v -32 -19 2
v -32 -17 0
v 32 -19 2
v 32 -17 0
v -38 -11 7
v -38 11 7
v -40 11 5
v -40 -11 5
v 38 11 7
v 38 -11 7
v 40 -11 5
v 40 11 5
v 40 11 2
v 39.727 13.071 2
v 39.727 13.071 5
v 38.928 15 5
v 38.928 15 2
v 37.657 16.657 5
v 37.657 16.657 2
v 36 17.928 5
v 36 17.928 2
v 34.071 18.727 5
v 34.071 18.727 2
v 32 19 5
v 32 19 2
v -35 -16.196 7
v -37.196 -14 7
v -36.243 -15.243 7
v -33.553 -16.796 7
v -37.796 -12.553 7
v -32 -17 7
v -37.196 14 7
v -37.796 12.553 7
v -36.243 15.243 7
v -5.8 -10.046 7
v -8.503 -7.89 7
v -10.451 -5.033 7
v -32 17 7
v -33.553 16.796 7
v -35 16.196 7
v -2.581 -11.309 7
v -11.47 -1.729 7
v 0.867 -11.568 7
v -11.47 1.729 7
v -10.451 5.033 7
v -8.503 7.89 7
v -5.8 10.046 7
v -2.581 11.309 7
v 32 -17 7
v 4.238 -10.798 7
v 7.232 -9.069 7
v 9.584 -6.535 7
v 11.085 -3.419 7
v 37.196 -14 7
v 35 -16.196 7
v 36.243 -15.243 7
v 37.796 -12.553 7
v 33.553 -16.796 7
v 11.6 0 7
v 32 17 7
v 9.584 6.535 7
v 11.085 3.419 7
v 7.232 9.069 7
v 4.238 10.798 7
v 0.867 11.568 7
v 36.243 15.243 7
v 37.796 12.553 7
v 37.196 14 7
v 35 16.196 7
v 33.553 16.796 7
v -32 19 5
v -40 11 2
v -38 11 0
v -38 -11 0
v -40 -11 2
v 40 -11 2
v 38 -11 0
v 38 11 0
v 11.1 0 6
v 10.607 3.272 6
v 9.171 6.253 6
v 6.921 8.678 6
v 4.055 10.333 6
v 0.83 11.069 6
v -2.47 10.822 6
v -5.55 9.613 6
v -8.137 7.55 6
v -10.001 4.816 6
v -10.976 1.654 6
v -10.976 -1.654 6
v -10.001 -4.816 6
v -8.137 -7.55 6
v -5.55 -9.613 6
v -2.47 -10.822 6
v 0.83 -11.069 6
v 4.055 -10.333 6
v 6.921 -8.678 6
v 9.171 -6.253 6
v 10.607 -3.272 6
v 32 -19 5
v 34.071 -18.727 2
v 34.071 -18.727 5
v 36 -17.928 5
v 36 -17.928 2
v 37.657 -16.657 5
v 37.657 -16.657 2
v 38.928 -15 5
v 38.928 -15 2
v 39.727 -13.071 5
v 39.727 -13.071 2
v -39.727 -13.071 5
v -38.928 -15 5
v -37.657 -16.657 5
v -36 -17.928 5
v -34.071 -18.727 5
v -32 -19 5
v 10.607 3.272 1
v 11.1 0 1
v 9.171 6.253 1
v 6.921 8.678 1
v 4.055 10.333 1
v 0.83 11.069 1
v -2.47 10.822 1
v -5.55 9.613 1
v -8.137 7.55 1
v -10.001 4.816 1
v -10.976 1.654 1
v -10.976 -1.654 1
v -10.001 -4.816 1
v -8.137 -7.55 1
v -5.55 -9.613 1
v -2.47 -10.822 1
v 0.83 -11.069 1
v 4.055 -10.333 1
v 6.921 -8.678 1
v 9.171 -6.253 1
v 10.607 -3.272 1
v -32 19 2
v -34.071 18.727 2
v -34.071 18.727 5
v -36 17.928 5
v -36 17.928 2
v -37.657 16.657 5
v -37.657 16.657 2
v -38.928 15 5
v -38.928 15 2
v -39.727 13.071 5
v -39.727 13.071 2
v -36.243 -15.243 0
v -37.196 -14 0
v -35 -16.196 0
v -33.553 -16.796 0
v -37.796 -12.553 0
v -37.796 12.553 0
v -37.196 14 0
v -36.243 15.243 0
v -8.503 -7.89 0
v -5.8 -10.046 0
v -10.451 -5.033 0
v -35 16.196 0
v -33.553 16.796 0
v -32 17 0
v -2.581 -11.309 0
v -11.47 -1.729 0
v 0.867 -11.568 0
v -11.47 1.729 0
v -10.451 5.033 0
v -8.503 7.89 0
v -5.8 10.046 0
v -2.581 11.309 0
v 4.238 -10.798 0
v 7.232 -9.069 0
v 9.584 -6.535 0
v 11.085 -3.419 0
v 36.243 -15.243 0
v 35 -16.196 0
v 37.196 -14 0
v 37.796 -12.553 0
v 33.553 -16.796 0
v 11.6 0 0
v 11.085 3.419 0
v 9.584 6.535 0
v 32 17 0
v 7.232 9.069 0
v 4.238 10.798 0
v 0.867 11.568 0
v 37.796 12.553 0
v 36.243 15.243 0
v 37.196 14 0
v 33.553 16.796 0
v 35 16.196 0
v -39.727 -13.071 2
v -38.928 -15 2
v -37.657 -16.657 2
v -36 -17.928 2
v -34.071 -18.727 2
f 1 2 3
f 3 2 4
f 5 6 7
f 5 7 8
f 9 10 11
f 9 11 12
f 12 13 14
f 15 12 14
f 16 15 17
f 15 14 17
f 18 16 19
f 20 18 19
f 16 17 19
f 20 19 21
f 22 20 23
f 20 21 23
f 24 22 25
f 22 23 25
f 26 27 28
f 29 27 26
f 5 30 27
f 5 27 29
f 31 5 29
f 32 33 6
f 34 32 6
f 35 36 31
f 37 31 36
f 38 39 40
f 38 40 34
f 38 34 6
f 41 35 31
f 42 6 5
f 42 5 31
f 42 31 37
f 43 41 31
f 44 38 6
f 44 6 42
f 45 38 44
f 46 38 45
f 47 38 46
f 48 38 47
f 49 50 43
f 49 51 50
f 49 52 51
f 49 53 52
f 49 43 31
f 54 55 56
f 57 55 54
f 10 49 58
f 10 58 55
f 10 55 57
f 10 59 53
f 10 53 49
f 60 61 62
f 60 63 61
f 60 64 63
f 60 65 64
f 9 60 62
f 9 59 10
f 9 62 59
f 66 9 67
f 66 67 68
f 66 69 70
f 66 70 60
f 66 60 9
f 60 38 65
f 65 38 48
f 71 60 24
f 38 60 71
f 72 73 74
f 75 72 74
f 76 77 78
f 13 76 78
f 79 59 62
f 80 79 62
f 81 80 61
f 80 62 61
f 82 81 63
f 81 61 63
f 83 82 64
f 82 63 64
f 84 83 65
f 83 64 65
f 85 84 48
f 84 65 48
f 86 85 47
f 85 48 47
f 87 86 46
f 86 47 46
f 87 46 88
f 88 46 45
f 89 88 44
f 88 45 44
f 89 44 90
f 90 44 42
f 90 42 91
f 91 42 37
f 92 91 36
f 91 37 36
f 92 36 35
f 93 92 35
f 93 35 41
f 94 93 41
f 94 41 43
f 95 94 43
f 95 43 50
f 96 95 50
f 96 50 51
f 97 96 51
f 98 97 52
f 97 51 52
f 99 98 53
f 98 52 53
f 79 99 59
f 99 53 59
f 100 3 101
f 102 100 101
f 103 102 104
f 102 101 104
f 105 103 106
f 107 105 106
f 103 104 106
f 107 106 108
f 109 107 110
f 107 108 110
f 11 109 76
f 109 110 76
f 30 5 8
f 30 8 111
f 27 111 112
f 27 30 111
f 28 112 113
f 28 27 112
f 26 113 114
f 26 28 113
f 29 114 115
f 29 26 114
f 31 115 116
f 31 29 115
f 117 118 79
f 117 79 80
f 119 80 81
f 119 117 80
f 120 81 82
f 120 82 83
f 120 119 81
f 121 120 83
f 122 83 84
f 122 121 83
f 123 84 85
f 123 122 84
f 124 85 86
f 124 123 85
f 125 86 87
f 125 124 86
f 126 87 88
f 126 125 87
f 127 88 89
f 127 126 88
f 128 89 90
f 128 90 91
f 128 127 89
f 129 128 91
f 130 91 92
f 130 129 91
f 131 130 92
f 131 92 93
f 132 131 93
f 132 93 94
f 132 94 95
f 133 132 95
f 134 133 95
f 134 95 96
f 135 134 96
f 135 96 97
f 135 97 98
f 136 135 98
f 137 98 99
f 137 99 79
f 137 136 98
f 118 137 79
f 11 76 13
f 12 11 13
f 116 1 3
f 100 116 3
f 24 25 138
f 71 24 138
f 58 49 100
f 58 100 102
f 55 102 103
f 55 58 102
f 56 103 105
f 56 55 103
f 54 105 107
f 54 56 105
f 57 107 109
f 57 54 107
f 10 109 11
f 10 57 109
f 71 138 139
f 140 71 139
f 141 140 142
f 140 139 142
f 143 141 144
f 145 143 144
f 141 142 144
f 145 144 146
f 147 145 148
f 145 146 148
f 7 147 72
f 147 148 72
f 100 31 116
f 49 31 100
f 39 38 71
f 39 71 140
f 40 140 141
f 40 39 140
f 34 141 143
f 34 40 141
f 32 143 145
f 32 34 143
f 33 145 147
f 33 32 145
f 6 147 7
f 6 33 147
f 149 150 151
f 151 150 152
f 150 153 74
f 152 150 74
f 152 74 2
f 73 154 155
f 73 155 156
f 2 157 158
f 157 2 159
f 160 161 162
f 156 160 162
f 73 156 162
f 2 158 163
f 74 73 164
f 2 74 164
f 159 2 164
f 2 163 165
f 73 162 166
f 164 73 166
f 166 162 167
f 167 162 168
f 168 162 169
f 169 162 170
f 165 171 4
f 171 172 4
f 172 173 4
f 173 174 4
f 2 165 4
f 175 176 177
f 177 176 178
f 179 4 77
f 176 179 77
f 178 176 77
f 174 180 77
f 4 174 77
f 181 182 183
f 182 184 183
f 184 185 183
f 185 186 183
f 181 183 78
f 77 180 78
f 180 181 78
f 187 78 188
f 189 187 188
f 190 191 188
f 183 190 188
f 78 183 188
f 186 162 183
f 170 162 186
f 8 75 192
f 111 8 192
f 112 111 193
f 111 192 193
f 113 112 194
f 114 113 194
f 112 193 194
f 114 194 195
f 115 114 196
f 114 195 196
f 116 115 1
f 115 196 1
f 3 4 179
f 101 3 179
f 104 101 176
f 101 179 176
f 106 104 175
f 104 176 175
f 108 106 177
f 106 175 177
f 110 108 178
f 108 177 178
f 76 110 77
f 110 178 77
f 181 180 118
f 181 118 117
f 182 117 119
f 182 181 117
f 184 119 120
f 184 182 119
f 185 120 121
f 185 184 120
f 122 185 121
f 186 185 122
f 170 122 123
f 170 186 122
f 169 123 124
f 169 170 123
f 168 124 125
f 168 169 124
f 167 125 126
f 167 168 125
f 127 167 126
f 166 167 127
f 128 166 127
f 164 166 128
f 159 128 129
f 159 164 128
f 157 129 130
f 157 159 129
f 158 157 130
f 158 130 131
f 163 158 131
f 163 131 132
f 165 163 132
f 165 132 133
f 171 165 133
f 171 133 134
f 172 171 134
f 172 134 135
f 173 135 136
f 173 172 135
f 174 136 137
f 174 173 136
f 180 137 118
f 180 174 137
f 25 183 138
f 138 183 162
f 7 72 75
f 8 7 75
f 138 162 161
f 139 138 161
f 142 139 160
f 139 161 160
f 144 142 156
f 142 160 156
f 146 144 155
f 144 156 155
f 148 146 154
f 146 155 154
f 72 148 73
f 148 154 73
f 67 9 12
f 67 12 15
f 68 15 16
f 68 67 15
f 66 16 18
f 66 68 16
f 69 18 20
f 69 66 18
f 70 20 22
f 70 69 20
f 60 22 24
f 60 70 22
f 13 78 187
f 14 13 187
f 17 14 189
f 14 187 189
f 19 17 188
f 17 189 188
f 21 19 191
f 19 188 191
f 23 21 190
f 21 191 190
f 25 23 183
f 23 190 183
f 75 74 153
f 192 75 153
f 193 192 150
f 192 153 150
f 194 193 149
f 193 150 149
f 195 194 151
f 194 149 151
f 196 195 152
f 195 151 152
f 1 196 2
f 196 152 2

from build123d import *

# Parameters (mm, degrees)
F0_R     = 11.1
F1_DEPTH = 7
F2_SIZE  = 2
F3_SIZE2 = 0.5
F3_SIZE  = 1


with BuildPart() as f1:
    # F0 (on Top) → F1 (new body)
    with BuildSketch(Plane.XY):
        with BuildLine():
            Line((-32, -19), (32, -19))
            ThreePointArc((32, -19), (37.6568542495, -16.6568542495), (40, -11))
            Line((40, -11), (40, 11))
            ThreePointArc((40, 11), (37.6568542495, 16.6568542495), (32, 19))
            Line((32, 19), (-32, 19))
            ThreePointArc((-32, 19), (-37.6568542495, 16.6568542495), (-40, 11))
            Line((-40, 11), (-40, -11))
            ThreePointArc((-40, -11), (-37.6568542495, -16.6568542495), (-32, -19))
        make_face()
        Circle(F0_R, mode=Mode.SUBTRACT)
    extrude(amount=F1_DEPTH)

    # F2
    f2_edges = [f1.edges().sort_by_distance(p)[0] for p in [
        (0, -19, 7),
        (0, -19, 0),
    ]]
    chamfer(f2_edges, length=F2_SIZE)

    # F3
    f3_edges = [f1.edges().sort_by_distance(p)[0] for p in [
        (-11.1, 0, 7),
        (-11.1, 0, 0),
    ]]
    f3_side = f1.faces().sort_by_distance((-11.1, 0, 3.5))[0]
    chamfer(f3_edges, length=F3_SIZE, length2=F3_SIZE2, reference=f3_side)


solid = f1.part
